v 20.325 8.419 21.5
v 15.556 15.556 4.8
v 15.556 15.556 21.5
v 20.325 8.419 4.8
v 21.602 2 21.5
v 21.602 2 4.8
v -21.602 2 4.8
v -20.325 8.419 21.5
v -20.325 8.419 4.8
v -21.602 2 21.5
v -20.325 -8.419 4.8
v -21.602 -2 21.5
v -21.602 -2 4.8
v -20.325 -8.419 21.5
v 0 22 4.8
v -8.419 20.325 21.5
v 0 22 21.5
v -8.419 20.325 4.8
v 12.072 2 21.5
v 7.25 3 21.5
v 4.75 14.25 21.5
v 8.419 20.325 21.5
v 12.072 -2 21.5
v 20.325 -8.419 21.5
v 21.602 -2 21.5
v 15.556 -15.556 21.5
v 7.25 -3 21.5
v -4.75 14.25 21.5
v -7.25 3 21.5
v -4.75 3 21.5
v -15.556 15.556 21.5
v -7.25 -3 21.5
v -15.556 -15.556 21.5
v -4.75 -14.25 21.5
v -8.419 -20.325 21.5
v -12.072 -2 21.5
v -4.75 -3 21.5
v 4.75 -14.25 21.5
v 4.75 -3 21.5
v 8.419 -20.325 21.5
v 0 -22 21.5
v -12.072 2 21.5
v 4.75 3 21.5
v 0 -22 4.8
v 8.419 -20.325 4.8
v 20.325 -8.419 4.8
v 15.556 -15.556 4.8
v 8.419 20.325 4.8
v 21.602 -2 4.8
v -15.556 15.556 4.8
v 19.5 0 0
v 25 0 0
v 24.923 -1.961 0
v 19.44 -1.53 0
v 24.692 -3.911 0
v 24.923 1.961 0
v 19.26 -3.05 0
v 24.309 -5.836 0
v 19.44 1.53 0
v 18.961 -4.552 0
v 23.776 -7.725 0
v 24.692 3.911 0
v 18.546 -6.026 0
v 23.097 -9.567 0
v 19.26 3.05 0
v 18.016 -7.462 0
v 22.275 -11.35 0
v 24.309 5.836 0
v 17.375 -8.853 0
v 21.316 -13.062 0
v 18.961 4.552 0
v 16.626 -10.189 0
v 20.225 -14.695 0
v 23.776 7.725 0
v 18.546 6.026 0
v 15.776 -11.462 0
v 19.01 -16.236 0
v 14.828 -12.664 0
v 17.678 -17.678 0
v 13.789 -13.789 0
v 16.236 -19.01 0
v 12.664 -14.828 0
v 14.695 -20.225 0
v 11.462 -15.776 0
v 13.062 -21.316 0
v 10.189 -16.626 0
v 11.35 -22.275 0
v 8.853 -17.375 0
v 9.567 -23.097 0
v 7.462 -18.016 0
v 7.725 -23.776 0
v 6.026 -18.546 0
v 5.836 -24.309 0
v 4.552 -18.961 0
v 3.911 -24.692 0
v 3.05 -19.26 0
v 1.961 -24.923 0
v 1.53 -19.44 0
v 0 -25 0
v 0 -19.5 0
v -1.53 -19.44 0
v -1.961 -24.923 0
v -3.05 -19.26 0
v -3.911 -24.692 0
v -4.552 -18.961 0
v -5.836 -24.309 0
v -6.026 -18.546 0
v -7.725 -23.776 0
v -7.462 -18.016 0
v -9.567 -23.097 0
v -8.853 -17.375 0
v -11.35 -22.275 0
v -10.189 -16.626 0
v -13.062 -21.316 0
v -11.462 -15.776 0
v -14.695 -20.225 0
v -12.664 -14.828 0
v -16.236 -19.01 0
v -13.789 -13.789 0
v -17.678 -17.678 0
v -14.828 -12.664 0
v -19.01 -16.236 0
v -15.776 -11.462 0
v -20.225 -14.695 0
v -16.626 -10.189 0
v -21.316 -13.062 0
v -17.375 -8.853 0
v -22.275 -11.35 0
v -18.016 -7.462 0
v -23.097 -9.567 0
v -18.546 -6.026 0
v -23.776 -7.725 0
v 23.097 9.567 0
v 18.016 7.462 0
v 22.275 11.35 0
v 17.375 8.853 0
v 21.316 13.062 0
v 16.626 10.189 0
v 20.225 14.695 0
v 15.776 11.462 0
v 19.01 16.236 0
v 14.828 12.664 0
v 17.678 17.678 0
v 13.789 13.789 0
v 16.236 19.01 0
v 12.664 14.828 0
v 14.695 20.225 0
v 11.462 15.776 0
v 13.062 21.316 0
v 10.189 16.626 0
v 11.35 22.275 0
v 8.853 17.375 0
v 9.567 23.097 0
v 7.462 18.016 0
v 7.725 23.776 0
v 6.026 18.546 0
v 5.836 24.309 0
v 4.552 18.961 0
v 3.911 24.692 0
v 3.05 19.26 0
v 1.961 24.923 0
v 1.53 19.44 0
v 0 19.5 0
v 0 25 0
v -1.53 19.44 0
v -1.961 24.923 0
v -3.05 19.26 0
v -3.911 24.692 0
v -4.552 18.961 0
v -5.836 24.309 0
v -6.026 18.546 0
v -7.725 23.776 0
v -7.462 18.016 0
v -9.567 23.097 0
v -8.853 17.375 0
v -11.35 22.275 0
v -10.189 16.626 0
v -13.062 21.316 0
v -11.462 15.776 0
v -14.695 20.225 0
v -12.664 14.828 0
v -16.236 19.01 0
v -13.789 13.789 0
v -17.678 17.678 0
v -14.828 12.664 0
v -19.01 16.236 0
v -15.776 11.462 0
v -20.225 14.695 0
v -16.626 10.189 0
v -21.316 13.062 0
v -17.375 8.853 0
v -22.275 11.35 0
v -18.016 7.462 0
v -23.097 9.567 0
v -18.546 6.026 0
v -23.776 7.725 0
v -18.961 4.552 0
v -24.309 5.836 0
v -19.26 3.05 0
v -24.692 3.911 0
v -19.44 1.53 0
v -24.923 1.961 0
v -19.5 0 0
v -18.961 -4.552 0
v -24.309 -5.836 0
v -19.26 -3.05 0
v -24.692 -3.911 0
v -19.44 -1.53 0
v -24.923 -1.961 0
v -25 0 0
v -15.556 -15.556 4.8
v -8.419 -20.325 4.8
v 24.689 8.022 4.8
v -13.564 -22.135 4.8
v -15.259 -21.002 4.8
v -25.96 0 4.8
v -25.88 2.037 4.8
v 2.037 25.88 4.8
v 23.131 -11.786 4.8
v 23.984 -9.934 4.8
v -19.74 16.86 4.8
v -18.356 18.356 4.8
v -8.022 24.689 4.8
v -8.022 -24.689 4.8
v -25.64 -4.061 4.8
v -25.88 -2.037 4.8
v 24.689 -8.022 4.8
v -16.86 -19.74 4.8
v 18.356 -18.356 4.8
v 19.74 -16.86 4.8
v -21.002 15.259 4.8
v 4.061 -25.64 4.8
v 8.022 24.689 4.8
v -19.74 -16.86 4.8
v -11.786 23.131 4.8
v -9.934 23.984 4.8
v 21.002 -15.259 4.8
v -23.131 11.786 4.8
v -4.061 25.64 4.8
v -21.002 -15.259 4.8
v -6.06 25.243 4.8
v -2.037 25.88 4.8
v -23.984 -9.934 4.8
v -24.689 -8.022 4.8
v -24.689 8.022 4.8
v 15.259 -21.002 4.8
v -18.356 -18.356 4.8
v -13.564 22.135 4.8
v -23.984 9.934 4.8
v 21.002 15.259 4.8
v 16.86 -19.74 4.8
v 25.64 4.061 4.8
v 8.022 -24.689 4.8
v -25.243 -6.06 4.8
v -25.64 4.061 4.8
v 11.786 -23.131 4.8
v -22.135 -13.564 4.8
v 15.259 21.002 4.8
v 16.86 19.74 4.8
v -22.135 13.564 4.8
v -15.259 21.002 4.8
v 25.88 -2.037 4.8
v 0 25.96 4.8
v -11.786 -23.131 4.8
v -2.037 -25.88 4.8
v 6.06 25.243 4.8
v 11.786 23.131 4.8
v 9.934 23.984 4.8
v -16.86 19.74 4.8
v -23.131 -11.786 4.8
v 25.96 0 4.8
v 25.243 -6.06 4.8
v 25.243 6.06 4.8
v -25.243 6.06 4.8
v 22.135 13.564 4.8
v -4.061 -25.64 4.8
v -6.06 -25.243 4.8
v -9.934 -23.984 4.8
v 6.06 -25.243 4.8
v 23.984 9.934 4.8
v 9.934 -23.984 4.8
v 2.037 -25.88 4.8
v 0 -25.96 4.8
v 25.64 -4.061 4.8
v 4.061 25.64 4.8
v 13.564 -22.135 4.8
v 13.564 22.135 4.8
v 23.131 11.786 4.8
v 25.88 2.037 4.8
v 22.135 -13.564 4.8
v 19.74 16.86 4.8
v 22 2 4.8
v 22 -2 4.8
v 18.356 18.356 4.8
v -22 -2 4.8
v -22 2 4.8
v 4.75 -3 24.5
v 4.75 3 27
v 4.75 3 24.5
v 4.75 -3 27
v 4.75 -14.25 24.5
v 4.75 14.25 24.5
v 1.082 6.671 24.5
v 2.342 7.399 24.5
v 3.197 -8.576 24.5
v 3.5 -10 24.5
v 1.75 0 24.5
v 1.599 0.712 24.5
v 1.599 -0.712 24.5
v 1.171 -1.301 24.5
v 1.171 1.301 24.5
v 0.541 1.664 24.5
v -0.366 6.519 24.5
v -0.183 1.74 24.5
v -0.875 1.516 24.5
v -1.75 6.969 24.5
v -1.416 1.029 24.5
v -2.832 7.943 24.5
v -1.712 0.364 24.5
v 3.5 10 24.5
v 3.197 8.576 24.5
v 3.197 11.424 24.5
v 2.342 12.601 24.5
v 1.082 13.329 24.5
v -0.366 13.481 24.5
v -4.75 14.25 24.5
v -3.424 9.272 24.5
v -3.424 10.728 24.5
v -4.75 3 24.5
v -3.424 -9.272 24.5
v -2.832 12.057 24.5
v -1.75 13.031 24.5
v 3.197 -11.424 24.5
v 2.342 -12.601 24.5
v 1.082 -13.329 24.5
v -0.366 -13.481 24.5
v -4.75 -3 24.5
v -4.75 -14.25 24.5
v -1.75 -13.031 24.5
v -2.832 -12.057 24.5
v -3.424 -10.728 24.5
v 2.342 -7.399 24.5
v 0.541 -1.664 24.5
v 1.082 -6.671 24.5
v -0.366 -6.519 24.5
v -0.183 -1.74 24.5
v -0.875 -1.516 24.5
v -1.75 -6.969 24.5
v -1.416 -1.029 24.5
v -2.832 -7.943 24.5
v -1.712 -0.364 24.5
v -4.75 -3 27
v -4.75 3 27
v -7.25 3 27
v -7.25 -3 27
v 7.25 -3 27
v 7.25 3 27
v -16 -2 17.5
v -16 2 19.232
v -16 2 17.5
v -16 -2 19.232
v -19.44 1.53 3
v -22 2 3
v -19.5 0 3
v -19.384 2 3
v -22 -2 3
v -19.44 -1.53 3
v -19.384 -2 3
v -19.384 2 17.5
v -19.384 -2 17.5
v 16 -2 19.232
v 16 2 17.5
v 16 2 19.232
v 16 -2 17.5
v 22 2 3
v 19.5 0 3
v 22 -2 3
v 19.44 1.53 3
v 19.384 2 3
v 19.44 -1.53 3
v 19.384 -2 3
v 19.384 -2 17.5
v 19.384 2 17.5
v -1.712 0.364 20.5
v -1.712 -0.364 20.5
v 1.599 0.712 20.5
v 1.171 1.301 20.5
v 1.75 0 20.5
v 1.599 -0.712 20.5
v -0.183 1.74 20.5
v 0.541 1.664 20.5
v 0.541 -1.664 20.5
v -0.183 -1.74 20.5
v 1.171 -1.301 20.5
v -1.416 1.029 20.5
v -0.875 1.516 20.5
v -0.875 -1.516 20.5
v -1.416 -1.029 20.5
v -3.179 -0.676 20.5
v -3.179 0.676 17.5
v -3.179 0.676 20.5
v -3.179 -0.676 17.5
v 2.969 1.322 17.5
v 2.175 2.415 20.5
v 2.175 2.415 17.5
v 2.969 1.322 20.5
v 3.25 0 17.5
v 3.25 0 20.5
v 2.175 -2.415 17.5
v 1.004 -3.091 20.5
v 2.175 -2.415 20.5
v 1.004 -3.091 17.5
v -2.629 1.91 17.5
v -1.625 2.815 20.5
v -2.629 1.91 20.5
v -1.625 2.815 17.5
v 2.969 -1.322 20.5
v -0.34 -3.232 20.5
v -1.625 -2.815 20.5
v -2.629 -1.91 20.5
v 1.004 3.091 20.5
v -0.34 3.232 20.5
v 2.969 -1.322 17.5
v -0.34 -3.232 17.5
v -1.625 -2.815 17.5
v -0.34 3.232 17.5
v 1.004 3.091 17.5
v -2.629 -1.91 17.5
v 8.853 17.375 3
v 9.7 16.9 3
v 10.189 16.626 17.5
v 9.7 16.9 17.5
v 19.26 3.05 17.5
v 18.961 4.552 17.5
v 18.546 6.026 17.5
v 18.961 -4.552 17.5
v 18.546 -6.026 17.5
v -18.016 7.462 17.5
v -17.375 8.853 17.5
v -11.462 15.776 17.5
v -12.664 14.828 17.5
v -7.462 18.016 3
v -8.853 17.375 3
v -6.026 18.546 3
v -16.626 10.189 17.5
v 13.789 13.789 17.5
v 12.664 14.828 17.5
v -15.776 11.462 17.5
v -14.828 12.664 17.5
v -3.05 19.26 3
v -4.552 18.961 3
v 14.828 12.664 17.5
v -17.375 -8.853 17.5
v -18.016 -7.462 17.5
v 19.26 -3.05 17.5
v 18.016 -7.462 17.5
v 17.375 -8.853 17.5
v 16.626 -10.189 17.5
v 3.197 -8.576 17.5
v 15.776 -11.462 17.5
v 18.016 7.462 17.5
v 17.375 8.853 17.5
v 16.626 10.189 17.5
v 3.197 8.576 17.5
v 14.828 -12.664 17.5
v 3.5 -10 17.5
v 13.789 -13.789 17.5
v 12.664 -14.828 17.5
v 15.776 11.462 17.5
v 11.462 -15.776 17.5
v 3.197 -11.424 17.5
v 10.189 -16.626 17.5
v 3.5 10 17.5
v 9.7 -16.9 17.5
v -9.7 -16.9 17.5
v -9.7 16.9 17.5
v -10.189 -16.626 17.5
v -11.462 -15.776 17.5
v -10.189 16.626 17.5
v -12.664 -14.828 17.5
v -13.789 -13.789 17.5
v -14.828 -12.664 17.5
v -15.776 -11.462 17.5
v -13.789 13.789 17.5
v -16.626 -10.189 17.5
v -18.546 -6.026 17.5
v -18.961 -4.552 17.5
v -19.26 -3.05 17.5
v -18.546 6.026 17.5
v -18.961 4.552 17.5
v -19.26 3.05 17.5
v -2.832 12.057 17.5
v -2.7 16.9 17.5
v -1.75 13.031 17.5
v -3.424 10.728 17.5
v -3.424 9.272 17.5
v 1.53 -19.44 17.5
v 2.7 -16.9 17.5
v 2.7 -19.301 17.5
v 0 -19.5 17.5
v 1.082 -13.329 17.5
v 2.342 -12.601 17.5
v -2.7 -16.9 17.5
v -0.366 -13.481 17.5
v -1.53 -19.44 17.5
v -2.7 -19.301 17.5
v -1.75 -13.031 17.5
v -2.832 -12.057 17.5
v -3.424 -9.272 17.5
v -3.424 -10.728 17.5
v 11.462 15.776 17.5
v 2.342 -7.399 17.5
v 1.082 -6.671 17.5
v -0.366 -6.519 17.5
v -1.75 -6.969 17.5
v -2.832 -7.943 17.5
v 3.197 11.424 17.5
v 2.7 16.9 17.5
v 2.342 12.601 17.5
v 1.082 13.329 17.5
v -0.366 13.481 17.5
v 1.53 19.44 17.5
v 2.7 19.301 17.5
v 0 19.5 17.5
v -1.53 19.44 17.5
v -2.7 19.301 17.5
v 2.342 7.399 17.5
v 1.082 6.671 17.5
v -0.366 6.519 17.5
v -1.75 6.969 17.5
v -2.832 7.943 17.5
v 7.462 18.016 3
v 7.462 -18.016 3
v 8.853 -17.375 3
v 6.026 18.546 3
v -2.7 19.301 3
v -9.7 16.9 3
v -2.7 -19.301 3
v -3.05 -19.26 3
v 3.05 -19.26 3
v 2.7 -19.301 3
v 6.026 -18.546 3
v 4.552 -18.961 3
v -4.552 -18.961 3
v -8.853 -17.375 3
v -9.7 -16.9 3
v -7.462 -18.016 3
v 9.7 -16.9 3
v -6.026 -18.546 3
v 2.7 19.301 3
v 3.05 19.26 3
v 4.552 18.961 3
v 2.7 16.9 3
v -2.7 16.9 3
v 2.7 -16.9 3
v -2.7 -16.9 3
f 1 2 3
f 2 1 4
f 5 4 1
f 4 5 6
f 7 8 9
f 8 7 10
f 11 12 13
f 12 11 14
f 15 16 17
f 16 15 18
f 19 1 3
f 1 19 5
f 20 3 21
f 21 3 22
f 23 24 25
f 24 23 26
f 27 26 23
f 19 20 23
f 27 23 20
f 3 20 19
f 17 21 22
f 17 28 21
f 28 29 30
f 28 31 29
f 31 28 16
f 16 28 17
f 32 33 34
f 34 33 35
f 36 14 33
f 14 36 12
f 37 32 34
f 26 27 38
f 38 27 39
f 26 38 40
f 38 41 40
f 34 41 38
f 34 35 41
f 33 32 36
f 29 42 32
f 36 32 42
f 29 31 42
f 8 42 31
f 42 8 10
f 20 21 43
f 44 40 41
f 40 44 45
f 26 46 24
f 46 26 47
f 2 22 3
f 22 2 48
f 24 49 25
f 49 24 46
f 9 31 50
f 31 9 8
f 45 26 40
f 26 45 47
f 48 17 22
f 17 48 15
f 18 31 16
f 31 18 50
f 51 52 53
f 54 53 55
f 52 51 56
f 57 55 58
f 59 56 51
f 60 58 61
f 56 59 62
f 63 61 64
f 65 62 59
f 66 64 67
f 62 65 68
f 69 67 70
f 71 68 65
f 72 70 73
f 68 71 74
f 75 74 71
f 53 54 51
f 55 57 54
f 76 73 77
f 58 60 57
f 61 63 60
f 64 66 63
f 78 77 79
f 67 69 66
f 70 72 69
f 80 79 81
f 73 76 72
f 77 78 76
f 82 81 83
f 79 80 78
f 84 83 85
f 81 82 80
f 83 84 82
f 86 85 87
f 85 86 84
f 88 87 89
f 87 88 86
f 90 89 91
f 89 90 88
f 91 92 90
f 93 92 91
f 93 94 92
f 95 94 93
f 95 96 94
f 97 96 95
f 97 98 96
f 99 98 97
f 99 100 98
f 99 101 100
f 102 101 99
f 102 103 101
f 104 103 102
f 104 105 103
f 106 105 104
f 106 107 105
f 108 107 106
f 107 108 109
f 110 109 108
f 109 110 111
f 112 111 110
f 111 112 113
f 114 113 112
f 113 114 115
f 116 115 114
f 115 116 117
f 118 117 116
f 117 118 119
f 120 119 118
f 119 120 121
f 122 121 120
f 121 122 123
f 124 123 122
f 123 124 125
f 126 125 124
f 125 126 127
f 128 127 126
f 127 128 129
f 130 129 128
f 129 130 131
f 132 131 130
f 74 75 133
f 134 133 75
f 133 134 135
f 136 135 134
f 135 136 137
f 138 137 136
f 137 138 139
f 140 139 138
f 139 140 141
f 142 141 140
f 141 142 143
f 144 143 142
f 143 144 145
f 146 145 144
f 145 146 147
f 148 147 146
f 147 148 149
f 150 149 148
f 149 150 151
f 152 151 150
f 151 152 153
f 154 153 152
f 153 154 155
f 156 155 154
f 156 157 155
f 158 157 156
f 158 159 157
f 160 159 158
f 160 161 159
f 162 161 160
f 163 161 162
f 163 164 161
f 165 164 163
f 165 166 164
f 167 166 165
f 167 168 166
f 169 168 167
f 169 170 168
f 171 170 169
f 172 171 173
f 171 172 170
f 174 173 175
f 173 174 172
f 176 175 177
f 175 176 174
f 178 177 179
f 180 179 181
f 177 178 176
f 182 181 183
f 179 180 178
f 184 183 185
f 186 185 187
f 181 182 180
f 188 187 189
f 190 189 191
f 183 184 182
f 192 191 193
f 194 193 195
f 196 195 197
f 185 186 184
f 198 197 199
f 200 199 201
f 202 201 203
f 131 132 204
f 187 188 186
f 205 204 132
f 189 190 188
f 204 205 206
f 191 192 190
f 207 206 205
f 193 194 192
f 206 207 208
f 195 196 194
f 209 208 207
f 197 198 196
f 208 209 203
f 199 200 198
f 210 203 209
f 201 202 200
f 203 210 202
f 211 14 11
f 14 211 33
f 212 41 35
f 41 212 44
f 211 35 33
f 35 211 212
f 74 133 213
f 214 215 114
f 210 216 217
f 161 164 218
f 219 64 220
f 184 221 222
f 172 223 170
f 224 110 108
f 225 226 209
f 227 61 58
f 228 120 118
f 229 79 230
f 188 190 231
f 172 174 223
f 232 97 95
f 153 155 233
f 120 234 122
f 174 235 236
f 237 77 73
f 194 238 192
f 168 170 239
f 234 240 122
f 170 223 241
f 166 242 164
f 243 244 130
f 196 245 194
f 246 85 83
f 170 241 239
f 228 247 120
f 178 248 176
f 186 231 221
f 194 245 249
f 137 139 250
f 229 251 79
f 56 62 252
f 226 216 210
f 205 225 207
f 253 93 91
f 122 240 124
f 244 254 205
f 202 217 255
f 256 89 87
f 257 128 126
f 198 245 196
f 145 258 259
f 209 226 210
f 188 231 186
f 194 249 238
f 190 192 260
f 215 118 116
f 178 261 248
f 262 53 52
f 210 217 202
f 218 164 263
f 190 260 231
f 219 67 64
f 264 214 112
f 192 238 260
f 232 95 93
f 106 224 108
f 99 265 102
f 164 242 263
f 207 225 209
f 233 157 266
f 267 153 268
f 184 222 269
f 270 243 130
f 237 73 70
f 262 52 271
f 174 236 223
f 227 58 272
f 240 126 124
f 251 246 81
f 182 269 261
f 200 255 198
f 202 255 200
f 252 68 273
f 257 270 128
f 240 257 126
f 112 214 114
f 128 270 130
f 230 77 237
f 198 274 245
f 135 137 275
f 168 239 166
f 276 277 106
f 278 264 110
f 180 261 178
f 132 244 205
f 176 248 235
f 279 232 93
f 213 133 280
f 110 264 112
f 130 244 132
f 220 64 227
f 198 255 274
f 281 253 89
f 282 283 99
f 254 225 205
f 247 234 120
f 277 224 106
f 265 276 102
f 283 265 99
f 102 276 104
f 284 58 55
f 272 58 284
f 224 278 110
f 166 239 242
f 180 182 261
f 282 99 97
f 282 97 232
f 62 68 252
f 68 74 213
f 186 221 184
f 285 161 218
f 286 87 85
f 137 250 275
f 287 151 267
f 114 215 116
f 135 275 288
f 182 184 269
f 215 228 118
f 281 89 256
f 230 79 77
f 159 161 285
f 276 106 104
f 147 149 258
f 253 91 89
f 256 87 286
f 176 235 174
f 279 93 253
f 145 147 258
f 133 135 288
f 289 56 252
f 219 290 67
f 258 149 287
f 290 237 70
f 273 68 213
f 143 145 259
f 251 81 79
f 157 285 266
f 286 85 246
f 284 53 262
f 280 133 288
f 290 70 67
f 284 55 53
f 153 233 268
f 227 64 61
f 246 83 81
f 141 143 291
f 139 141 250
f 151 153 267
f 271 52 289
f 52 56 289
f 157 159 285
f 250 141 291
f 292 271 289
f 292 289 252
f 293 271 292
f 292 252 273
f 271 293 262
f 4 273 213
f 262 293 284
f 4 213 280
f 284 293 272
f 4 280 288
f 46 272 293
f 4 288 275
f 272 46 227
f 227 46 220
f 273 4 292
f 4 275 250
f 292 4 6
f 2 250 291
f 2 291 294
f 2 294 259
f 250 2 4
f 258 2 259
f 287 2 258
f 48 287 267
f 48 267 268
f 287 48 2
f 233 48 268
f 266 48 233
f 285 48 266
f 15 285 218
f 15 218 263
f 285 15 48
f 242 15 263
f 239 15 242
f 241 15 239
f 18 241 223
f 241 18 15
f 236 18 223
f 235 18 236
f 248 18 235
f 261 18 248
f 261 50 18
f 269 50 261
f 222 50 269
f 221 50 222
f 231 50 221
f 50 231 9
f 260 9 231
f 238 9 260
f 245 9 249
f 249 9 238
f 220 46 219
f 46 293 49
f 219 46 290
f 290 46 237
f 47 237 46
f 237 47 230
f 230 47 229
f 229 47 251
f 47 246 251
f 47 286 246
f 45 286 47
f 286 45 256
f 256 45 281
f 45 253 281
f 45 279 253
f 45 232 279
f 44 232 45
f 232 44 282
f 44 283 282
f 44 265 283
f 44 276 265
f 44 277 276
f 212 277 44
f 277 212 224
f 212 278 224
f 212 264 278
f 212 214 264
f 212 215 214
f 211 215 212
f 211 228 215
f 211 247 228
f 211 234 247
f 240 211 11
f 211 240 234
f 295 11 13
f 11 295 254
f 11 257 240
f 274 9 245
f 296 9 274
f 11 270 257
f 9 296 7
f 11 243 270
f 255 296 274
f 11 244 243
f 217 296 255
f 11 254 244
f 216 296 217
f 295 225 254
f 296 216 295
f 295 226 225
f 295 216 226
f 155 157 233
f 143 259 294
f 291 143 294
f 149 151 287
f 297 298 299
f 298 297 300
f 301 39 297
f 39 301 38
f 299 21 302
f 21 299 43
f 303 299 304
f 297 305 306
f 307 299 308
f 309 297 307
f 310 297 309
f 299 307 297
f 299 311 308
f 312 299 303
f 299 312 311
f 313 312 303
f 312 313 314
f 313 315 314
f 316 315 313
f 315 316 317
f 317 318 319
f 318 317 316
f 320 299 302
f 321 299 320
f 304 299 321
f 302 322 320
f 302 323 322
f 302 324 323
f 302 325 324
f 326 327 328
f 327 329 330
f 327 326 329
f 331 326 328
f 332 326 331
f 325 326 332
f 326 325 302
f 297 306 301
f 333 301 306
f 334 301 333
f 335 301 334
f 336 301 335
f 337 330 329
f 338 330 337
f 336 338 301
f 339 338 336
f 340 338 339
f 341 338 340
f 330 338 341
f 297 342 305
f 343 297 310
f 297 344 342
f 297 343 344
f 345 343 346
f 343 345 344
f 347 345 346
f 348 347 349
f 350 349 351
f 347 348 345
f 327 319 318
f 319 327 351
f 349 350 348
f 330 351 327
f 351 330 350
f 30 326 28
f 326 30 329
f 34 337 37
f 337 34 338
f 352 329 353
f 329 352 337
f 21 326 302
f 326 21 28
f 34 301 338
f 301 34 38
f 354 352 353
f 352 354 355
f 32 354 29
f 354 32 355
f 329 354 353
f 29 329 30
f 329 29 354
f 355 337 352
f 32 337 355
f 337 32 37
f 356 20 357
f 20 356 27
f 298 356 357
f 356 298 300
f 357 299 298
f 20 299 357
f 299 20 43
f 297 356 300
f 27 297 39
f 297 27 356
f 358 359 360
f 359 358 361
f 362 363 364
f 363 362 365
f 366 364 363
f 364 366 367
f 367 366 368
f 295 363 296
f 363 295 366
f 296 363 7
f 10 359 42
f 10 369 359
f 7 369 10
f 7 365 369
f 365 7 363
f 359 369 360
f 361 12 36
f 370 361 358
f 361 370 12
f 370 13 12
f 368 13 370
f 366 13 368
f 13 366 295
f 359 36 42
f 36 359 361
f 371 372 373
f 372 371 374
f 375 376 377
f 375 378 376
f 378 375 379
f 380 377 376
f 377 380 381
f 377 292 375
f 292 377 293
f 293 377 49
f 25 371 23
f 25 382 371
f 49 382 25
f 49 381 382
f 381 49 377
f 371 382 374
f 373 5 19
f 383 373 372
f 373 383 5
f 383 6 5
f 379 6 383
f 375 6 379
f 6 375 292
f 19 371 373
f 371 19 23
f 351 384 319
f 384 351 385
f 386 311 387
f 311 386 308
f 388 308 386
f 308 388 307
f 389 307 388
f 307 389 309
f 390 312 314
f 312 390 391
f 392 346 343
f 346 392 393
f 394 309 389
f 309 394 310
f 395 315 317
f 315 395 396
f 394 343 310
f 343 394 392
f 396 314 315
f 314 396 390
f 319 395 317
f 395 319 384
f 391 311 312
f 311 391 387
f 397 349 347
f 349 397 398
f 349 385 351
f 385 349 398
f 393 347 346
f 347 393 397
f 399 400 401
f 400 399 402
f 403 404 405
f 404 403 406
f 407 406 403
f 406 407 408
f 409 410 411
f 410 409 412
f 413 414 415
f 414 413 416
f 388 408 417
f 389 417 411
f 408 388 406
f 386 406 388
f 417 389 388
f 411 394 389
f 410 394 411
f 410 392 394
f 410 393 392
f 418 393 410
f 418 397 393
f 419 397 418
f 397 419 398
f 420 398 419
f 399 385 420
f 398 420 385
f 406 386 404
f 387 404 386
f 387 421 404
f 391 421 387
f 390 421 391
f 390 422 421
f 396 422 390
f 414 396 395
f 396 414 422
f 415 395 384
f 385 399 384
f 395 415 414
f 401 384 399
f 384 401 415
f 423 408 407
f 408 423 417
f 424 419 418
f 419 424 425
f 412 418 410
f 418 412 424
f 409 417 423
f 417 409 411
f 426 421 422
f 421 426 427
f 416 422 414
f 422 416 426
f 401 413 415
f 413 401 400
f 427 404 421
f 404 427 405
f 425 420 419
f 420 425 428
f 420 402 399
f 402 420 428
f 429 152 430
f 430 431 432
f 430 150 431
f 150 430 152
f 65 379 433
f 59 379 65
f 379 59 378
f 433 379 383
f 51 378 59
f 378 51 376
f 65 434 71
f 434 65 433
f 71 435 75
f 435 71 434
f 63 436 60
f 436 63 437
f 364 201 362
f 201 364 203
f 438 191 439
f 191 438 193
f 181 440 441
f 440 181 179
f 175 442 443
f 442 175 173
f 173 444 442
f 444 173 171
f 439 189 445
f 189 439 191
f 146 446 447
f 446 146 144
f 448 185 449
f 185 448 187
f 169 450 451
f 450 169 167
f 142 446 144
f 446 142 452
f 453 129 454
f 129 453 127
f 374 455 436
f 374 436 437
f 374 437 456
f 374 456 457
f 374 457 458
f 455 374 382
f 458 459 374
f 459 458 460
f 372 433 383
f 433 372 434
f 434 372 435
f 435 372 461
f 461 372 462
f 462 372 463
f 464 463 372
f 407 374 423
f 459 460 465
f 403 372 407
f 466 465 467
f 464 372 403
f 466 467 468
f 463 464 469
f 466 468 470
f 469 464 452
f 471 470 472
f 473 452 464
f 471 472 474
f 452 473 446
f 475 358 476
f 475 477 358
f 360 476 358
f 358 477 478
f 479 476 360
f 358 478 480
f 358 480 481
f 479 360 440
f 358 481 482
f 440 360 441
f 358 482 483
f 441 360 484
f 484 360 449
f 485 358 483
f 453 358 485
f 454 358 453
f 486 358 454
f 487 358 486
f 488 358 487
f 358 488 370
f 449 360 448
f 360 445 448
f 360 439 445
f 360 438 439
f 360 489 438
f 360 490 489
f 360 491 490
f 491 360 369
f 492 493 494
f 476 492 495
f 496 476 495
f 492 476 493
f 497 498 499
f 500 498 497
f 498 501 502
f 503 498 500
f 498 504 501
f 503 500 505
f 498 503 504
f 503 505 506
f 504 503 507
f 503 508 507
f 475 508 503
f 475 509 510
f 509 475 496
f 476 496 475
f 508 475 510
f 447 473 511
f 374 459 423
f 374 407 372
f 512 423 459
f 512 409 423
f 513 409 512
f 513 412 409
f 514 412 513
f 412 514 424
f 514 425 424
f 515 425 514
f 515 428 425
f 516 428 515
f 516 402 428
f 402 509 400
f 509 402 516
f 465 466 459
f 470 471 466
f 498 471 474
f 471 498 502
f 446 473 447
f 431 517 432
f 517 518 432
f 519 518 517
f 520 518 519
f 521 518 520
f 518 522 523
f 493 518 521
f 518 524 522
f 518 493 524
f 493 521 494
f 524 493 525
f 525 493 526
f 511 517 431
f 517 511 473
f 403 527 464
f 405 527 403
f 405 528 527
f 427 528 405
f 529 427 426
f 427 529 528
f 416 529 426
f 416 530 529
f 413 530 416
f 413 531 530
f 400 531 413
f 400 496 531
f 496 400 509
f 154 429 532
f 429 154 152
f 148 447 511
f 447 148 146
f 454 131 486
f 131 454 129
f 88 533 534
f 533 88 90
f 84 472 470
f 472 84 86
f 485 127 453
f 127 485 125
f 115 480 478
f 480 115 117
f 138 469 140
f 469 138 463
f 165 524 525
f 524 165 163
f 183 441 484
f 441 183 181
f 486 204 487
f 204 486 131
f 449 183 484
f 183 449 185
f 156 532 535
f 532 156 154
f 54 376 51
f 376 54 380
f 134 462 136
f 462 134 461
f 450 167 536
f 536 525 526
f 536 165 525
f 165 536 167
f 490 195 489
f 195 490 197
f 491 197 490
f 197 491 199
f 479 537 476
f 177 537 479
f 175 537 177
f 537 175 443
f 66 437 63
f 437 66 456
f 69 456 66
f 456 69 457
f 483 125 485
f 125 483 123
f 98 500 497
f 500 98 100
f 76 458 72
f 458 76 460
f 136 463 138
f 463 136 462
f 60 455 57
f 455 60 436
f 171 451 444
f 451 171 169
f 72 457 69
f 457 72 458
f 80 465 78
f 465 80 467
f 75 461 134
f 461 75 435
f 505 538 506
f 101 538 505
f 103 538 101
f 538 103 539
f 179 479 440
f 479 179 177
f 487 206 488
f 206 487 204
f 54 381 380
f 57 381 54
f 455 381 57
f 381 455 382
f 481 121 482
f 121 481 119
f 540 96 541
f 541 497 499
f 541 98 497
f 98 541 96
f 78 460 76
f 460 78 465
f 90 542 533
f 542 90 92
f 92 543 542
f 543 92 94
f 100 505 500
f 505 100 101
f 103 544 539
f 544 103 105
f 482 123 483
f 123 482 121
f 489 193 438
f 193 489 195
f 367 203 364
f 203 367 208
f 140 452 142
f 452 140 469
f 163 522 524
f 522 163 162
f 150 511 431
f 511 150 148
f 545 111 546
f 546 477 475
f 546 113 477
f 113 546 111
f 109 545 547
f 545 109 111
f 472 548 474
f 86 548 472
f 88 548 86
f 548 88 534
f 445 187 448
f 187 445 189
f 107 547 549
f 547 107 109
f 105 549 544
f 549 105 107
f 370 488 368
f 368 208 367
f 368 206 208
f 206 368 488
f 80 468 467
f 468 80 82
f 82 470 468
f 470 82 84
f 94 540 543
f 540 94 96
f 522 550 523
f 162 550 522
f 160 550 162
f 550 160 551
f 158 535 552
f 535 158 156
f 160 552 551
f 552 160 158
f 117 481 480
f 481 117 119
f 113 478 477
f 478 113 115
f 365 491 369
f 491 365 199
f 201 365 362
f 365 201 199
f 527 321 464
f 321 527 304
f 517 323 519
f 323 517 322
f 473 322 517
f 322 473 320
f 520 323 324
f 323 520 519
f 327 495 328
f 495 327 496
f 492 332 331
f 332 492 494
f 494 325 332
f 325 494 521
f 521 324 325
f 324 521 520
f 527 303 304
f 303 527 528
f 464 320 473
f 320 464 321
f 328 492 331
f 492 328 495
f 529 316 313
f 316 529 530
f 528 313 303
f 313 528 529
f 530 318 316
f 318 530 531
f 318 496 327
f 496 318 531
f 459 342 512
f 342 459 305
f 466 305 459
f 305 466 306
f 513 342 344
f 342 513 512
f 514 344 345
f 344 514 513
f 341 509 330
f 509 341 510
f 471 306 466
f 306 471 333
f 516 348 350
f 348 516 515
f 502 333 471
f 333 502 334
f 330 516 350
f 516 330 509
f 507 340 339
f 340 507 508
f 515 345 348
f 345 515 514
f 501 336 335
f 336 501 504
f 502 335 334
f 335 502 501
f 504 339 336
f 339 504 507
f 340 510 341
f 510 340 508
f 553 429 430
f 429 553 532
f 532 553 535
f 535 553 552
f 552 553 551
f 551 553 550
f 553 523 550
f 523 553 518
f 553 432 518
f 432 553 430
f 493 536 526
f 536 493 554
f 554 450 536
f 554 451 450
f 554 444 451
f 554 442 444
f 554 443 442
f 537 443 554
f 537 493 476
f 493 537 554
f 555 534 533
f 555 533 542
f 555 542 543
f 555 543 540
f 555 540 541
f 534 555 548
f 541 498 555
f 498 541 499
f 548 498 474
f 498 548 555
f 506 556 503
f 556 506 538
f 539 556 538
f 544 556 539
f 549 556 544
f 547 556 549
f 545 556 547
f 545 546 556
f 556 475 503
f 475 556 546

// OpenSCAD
/*
 Parametric Schuko CEE 7/3 socket
 
 Copyright 2017 Anders Hammarquist <iko@iko.pp.se>
 Licensed under Creative Commons - Attribution - Share Alike
 
 Made using a negative "profile punch" that can be extracted
 and used to "punch" a schuko socket into any sufficiently large solid.
*/

// Diameter of cover
coverdiameter = 50; // [50:100]

// Thickness of cover
coverthickness = 4.8; // [2:0.2:15]

// Center screw offset (extreme values disables screw hole)
screwoffset = 0; // [-11:0.5:11]

// This is the socket punch. Includes cut-out for
// earthing contacts and holes for pins and center screw.
// Maximum screw offset from center is 10mm (use a larger
// value to remove the hole for the screw).
module schuko(screwoffset=0, screwdia=3.5, screwhead=6.5, screwsink=3)
{
    module earthing()
    {
        intersection() {
            union() {
                translate([-22,-2,3])
                    cube([6,4,20]);
                translate([-19,-2,17.5])
                    rotate([0,-30,0])
                        cube([15, 4, 4]);    
            }
            translate([-22,-3,3])
                cube([22,6,20]);
        }
    }
    
    difference() {
        union() {
            translate([0,0,-1])
                cylinder(r=39/2, $fn=80, h=18.5);
	                
            // Earthing cutouts
            color([1,1,1]) {
                earthing();
                
                rotate([0,0,180]) 
                    earthing();
                
            }             
            
            // Power pins
            translate([0,10,0])
                cylinder(r=7/2, $fn=15, h=30);
            translate([0,-10,0])
                cylinder(r=7/2, $fn=15, h=30);
            
            if (abs(screwoffset) <= 10) {
                // Center screw
                translate([screwoffset,0,0])
                    cylinder(r=screwdia/2, $fn=15, h=30);
                translate([screwoffset,0,0])
                    cylinder(r=screwhead/2, $fn=15, h=17.5+screwsink);
            }
        }
        
        // Side key profile
        translate([5.4/2,16.9,3]) 
            cube([7,3,20]);
        translate([-5.4/2-7,16.9,3])
            cube([7,3,20]);
        translate([5.4/2,-20.4,3])
            cube([7,3.5,20]);
        translate([-5.4/2-7,-20.4,3])
            cube([7,3.5,20]);
    }
}


rotate([0,0,0]){
    difference(){
        union() {
            translate([0,0,0])
                cylinder(r=44/2, $fn=16, h=21.5);
            // Lip
            rotate_extrude($fn=80) {
                polygon(points=[[0,0], [coverdiameter/2,0], 
                [coverdiameter/2+0.2*coverthickness,coverthickness],
                [0,coverthickness]]);
            }
            
            // Pin guard: 9.5 x 28.5 x 3mm (rounded ends)
            translate([-4.75,-14.25,21.5])
                cube([9.5, 28.5, 3]);

            // center screw standoff: 6 x 2.5 (above pin guard) x 2 - 3 
            // ( 8mm inside, 14 - 12.2 mm outside)    
            translate([-7.25, -3, 21.5])
                cube([2.5, 6, 5.5]);
            translate([4.75, -3, 21.5])
                cube([2.5, 6, 5.5]);

        }
        schuko(screwoffset=screwoffset);
    }
}
